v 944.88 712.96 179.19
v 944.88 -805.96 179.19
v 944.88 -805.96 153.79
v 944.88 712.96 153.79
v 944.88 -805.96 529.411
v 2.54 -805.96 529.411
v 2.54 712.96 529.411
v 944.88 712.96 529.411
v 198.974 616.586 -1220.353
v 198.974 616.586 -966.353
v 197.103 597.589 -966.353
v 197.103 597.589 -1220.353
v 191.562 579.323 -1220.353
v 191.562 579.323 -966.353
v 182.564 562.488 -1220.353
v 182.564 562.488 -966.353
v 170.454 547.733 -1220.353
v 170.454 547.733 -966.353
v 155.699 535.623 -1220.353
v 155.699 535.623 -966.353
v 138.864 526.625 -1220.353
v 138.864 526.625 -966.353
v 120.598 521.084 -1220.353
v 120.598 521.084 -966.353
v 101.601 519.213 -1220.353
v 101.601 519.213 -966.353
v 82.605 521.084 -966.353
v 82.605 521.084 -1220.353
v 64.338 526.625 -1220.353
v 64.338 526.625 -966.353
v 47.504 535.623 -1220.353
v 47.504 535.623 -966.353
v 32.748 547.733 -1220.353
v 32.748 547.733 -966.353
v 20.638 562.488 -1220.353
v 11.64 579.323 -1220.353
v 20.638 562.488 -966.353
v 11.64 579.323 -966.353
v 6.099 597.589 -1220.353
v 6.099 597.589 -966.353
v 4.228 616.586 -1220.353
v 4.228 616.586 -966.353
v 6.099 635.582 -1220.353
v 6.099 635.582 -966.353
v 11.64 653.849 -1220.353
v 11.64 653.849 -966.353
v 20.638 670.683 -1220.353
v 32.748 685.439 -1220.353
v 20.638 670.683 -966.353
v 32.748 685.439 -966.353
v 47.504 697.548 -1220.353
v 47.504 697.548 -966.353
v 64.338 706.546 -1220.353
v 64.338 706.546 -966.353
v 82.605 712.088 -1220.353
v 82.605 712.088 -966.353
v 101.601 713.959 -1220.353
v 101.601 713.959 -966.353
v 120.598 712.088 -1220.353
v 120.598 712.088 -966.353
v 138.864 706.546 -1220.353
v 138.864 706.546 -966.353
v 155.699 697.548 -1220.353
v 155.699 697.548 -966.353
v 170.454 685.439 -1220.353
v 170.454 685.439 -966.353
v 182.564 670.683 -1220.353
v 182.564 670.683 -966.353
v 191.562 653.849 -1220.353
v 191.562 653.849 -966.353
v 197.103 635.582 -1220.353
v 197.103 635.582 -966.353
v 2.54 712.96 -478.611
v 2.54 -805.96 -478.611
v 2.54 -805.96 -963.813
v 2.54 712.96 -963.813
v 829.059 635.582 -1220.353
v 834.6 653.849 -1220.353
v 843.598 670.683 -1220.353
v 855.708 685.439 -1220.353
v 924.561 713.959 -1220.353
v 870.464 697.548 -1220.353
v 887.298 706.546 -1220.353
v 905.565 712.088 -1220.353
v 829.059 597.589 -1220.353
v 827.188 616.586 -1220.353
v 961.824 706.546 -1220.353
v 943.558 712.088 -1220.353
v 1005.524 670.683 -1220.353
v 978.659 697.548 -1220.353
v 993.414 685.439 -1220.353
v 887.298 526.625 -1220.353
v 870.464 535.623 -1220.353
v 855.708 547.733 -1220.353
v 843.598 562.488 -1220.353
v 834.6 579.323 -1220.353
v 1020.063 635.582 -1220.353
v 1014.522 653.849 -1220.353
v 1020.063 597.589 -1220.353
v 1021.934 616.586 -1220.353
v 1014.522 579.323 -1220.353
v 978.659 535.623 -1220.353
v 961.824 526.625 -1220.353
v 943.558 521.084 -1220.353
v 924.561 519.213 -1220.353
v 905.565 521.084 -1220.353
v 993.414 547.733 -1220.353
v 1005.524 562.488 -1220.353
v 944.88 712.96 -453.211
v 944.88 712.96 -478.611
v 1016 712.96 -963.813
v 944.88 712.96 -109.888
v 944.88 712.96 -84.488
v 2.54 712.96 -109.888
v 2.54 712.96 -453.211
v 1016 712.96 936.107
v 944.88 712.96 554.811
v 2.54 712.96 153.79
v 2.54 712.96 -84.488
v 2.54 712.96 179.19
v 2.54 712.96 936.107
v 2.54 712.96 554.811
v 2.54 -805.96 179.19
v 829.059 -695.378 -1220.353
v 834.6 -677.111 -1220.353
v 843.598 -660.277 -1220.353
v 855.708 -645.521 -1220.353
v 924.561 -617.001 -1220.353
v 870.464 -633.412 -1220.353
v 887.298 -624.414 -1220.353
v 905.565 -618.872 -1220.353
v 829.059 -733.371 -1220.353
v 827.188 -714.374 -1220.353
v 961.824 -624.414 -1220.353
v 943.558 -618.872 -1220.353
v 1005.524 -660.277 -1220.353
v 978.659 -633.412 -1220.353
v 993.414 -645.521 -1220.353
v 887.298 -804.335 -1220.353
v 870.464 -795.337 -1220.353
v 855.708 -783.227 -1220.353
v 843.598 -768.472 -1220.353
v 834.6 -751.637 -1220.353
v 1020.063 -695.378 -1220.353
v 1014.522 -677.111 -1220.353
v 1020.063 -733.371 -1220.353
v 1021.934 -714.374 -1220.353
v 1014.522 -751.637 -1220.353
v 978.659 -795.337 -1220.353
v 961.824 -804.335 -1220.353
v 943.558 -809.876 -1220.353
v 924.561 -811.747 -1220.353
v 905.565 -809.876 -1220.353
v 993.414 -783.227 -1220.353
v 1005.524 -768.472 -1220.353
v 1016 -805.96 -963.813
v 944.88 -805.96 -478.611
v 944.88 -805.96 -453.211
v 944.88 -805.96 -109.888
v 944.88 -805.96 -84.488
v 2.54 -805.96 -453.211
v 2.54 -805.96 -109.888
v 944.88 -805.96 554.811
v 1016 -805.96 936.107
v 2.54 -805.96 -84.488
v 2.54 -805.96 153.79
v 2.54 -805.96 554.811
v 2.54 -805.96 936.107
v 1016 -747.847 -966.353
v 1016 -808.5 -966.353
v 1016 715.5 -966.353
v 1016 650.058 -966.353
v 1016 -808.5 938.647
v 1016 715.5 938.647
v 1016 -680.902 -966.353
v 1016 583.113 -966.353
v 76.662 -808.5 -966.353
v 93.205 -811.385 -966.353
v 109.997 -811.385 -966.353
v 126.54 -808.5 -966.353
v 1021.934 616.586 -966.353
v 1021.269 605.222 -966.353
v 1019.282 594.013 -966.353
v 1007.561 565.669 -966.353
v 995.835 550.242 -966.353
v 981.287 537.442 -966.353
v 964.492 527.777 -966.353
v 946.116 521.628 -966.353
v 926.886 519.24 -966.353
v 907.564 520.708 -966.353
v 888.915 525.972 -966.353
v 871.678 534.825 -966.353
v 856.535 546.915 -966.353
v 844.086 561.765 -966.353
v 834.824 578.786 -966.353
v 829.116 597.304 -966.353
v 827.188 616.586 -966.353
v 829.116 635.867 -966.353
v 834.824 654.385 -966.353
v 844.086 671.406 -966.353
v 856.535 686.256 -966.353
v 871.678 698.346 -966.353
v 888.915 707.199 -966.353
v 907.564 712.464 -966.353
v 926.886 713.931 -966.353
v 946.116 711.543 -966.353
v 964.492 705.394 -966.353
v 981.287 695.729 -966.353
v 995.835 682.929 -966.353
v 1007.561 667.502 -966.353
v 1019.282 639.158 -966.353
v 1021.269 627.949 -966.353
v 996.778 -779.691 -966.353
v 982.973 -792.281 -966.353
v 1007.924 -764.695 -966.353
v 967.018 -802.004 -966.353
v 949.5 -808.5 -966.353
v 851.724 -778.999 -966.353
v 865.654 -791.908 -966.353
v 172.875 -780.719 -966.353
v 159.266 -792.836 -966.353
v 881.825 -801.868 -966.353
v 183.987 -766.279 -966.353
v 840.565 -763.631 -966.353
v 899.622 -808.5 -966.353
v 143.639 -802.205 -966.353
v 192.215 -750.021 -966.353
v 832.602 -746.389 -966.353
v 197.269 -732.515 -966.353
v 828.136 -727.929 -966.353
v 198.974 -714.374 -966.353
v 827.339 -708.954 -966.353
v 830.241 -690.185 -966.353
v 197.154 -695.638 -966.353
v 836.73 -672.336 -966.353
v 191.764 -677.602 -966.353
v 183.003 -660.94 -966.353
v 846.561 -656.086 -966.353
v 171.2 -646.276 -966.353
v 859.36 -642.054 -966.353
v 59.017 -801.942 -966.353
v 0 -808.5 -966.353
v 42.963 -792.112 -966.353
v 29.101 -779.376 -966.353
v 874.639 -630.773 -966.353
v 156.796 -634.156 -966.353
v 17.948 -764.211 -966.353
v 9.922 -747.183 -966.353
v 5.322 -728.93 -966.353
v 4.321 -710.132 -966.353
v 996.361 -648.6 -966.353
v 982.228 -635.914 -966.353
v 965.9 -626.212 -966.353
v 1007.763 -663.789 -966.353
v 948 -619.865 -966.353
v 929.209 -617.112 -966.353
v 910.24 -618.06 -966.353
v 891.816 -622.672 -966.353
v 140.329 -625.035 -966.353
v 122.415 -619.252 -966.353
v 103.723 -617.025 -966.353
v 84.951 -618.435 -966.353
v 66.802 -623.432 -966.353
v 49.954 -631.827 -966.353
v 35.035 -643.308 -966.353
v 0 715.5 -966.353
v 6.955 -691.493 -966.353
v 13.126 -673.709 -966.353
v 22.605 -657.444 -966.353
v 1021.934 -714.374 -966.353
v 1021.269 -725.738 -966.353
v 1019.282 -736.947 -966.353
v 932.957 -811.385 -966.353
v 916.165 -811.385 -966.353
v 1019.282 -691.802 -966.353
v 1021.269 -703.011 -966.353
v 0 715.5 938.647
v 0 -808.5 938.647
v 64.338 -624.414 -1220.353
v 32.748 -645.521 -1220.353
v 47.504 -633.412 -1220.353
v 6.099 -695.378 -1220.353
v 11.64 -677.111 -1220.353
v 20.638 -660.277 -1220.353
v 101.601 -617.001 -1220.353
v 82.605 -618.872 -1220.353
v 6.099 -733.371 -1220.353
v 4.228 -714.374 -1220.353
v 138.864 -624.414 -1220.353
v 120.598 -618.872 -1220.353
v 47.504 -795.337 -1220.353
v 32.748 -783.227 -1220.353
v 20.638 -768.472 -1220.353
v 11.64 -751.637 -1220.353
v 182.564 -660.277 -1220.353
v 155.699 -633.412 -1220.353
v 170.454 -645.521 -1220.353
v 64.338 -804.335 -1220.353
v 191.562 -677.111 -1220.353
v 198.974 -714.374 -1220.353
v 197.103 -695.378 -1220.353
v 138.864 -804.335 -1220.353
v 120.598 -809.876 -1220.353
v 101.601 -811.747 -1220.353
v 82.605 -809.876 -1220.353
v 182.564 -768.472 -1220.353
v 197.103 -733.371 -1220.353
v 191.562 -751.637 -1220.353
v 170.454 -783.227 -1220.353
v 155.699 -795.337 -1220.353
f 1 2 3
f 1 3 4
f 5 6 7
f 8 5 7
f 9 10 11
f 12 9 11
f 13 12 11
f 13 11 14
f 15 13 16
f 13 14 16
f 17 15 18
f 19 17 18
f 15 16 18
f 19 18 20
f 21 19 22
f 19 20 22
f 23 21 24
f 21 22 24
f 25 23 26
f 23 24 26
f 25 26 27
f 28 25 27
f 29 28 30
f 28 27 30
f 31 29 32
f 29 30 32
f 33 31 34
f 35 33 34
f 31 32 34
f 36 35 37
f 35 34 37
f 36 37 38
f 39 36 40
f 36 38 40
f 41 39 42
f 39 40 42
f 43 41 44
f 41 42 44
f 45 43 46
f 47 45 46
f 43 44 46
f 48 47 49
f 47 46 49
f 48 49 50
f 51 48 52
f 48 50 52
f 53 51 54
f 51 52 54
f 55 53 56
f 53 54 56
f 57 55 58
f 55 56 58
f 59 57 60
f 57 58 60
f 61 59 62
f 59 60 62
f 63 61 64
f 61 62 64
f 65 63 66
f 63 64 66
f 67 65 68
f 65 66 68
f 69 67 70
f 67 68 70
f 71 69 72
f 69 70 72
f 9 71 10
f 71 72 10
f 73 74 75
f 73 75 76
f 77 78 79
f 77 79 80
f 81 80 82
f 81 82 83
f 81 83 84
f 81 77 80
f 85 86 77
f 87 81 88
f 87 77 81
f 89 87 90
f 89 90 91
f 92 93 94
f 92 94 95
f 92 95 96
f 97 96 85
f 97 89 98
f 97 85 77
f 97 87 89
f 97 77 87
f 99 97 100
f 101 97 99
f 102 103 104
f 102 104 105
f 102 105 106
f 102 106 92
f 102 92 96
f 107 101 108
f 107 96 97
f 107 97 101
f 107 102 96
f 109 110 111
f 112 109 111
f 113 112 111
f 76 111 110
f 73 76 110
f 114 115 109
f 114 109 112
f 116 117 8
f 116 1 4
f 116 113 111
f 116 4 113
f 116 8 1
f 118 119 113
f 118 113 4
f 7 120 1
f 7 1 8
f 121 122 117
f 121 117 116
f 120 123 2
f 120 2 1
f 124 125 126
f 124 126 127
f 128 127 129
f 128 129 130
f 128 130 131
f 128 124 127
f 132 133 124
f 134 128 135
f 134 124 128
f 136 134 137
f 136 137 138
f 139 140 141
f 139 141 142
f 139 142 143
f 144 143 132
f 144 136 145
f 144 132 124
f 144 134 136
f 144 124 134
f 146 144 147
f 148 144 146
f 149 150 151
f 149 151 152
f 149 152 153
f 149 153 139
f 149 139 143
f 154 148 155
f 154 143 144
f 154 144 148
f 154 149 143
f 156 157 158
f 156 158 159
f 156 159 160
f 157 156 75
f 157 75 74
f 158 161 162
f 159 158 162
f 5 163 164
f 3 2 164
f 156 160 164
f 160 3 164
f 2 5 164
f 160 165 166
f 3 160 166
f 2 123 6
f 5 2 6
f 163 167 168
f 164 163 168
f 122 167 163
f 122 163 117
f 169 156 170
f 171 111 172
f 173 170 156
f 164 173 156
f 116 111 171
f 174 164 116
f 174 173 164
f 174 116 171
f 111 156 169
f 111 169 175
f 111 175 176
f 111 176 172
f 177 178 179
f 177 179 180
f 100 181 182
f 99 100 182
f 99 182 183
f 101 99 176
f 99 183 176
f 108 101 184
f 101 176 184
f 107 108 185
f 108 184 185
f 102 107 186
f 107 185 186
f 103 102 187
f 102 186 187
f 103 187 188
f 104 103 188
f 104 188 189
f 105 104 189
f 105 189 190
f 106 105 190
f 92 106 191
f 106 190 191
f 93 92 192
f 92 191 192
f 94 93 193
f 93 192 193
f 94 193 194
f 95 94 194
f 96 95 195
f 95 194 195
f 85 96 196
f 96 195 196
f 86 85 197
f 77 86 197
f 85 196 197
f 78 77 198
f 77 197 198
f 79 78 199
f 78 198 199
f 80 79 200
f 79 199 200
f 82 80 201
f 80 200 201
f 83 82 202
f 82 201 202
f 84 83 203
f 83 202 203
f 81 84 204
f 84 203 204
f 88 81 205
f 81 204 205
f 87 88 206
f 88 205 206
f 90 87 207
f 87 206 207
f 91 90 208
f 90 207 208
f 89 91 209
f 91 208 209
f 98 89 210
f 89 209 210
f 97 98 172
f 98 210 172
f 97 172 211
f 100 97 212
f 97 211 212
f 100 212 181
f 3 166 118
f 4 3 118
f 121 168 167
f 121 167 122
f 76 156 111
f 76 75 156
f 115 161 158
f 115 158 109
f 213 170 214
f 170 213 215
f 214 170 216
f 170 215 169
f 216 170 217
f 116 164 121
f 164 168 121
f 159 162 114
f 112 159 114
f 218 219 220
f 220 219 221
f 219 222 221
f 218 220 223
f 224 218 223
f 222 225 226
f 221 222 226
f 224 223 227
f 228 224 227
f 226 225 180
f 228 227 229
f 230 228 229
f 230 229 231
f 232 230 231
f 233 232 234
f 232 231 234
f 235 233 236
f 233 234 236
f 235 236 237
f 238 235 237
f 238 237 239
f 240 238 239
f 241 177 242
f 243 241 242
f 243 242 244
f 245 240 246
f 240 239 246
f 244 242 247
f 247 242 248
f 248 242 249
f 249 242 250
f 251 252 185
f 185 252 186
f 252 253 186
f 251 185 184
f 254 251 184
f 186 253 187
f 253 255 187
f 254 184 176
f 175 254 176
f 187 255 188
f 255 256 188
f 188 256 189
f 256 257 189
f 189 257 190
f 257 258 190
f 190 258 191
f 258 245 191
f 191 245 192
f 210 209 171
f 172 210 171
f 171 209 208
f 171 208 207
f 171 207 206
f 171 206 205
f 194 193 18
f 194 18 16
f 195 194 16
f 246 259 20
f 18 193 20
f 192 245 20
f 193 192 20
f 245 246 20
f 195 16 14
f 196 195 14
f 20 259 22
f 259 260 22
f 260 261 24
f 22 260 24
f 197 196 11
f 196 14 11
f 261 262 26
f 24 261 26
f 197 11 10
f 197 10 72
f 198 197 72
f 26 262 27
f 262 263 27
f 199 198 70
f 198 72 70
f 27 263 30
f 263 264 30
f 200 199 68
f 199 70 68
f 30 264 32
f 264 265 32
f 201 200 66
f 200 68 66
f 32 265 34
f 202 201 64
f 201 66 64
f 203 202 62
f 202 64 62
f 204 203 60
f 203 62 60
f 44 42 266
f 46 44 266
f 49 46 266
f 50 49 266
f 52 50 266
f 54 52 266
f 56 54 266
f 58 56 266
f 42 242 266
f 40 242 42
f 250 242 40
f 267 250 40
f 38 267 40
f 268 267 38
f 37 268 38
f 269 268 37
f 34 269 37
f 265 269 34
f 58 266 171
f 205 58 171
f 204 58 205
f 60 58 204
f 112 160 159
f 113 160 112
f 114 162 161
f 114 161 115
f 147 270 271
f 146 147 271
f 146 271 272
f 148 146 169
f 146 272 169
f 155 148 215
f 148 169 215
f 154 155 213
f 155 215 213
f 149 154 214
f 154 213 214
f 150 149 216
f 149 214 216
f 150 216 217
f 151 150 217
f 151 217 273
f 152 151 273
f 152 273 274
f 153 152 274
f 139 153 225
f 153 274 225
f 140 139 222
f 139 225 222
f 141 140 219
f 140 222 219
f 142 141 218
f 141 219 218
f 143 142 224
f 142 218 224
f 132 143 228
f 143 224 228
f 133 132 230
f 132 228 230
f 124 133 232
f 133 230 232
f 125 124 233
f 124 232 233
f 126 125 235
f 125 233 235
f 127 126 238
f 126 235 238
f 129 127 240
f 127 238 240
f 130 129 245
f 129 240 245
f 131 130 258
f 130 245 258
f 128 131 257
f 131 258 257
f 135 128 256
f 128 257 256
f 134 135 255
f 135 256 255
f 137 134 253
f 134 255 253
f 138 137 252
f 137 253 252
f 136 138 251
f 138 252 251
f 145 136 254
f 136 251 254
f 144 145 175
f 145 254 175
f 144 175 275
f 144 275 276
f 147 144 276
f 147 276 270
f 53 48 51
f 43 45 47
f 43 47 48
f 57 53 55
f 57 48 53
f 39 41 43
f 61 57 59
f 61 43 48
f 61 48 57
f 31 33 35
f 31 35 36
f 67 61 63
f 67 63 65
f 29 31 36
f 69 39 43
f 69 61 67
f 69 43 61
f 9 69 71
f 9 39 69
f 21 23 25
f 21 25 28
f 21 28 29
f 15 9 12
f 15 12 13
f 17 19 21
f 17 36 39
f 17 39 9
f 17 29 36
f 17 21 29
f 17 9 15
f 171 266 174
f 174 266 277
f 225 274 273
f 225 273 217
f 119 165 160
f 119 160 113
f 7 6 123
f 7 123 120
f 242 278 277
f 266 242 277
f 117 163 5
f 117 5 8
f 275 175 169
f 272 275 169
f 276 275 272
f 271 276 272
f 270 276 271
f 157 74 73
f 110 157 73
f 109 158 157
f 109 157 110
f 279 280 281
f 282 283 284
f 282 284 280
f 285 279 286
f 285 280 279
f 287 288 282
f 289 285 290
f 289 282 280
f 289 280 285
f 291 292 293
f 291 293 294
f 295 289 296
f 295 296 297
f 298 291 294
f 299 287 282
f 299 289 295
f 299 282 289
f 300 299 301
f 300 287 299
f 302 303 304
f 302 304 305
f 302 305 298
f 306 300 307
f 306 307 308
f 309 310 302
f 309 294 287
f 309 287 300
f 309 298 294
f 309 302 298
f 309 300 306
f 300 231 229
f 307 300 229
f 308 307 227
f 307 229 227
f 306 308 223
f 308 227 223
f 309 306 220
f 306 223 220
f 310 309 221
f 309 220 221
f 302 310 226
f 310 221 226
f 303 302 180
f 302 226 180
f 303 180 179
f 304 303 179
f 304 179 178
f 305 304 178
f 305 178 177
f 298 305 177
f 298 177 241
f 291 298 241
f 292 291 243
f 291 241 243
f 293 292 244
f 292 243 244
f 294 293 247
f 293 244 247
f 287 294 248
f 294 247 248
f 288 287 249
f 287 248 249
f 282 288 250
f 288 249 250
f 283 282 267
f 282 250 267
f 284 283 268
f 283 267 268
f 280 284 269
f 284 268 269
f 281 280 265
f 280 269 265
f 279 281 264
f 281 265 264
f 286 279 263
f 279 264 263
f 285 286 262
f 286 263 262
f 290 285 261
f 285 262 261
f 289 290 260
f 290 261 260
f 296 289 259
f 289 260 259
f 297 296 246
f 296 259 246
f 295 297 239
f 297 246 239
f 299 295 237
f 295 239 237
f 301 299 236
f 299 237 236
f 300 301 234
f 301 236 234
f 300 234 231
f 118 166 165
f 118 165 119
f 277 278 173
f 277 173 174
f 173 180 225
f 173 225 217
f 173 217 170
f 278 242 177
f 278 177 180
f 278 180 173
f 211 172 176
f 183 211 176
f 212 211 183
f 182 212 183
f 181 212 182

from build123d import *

# Parameters (mm, degrees)
F0_W     = 1524
F0_H     = 1905
F1_DEPTH = 1016
F2_T     = -2.54
F3_W     = 1518.92
F3_H     = 25.4
F4_DEPTH = 942.34
F5_R     = 97.372943
F6_DEPTH = 254


with BuildPart() as f1:
    # F0 (on Right) → F1 (new body)
    with BuildSketch(Plane.YZ):
        with Locations((-46.499569, -13.852631)):
            Rectangle(F0_W, F0_H)
    extrude(amount=F1_DEPTH)

    # F2
    f2_openings = [f1.faces().sort_by_distance(p)[0] for p in [
        (1016, -46.499569, -13.852631),
    ]]
    offset(amount=F2_T, openings=f2_openings)

    # F3 (on face) → F4 (join)
    with BuildSketch(Plane.YZ.offset(2.54)):
        with Locations((-46.499569, -465.910843)):
            Rectangle(F3_W, F3_H)
        with Locations((-46.499569, 542.111227)):
            Rectangle(F3_W, F3_H)
        with Locations((-46.499569, 166.490295)):
            Rectangle(F3_W, F3_H)
        with Locations((-46.499569, -97.188047)):
            Rectangle(F3_W, F3_H)
    extrude(amount=F4_DEPTH)

    # F5 (on face) → F6 (join)
    with BuildSketch(Plane(origin=(0, 0, -966.352631), x_dir=(1, 0, 0), z_dir=(0, 0, -1))):
        with Locations((924.561083, 714.374423)):
            Circle(F5_R)
        with Locations((924.561083, -616.585577)):
            Circle(F5_R)
        with Locations((101.601083, 714.374423)):
            Circle(F5_R)
        with Locations((101.601083, -616.585577)):
            Circle(F5_R)
    extrude(amount=F6_DEPTH)


solid = f1.part
